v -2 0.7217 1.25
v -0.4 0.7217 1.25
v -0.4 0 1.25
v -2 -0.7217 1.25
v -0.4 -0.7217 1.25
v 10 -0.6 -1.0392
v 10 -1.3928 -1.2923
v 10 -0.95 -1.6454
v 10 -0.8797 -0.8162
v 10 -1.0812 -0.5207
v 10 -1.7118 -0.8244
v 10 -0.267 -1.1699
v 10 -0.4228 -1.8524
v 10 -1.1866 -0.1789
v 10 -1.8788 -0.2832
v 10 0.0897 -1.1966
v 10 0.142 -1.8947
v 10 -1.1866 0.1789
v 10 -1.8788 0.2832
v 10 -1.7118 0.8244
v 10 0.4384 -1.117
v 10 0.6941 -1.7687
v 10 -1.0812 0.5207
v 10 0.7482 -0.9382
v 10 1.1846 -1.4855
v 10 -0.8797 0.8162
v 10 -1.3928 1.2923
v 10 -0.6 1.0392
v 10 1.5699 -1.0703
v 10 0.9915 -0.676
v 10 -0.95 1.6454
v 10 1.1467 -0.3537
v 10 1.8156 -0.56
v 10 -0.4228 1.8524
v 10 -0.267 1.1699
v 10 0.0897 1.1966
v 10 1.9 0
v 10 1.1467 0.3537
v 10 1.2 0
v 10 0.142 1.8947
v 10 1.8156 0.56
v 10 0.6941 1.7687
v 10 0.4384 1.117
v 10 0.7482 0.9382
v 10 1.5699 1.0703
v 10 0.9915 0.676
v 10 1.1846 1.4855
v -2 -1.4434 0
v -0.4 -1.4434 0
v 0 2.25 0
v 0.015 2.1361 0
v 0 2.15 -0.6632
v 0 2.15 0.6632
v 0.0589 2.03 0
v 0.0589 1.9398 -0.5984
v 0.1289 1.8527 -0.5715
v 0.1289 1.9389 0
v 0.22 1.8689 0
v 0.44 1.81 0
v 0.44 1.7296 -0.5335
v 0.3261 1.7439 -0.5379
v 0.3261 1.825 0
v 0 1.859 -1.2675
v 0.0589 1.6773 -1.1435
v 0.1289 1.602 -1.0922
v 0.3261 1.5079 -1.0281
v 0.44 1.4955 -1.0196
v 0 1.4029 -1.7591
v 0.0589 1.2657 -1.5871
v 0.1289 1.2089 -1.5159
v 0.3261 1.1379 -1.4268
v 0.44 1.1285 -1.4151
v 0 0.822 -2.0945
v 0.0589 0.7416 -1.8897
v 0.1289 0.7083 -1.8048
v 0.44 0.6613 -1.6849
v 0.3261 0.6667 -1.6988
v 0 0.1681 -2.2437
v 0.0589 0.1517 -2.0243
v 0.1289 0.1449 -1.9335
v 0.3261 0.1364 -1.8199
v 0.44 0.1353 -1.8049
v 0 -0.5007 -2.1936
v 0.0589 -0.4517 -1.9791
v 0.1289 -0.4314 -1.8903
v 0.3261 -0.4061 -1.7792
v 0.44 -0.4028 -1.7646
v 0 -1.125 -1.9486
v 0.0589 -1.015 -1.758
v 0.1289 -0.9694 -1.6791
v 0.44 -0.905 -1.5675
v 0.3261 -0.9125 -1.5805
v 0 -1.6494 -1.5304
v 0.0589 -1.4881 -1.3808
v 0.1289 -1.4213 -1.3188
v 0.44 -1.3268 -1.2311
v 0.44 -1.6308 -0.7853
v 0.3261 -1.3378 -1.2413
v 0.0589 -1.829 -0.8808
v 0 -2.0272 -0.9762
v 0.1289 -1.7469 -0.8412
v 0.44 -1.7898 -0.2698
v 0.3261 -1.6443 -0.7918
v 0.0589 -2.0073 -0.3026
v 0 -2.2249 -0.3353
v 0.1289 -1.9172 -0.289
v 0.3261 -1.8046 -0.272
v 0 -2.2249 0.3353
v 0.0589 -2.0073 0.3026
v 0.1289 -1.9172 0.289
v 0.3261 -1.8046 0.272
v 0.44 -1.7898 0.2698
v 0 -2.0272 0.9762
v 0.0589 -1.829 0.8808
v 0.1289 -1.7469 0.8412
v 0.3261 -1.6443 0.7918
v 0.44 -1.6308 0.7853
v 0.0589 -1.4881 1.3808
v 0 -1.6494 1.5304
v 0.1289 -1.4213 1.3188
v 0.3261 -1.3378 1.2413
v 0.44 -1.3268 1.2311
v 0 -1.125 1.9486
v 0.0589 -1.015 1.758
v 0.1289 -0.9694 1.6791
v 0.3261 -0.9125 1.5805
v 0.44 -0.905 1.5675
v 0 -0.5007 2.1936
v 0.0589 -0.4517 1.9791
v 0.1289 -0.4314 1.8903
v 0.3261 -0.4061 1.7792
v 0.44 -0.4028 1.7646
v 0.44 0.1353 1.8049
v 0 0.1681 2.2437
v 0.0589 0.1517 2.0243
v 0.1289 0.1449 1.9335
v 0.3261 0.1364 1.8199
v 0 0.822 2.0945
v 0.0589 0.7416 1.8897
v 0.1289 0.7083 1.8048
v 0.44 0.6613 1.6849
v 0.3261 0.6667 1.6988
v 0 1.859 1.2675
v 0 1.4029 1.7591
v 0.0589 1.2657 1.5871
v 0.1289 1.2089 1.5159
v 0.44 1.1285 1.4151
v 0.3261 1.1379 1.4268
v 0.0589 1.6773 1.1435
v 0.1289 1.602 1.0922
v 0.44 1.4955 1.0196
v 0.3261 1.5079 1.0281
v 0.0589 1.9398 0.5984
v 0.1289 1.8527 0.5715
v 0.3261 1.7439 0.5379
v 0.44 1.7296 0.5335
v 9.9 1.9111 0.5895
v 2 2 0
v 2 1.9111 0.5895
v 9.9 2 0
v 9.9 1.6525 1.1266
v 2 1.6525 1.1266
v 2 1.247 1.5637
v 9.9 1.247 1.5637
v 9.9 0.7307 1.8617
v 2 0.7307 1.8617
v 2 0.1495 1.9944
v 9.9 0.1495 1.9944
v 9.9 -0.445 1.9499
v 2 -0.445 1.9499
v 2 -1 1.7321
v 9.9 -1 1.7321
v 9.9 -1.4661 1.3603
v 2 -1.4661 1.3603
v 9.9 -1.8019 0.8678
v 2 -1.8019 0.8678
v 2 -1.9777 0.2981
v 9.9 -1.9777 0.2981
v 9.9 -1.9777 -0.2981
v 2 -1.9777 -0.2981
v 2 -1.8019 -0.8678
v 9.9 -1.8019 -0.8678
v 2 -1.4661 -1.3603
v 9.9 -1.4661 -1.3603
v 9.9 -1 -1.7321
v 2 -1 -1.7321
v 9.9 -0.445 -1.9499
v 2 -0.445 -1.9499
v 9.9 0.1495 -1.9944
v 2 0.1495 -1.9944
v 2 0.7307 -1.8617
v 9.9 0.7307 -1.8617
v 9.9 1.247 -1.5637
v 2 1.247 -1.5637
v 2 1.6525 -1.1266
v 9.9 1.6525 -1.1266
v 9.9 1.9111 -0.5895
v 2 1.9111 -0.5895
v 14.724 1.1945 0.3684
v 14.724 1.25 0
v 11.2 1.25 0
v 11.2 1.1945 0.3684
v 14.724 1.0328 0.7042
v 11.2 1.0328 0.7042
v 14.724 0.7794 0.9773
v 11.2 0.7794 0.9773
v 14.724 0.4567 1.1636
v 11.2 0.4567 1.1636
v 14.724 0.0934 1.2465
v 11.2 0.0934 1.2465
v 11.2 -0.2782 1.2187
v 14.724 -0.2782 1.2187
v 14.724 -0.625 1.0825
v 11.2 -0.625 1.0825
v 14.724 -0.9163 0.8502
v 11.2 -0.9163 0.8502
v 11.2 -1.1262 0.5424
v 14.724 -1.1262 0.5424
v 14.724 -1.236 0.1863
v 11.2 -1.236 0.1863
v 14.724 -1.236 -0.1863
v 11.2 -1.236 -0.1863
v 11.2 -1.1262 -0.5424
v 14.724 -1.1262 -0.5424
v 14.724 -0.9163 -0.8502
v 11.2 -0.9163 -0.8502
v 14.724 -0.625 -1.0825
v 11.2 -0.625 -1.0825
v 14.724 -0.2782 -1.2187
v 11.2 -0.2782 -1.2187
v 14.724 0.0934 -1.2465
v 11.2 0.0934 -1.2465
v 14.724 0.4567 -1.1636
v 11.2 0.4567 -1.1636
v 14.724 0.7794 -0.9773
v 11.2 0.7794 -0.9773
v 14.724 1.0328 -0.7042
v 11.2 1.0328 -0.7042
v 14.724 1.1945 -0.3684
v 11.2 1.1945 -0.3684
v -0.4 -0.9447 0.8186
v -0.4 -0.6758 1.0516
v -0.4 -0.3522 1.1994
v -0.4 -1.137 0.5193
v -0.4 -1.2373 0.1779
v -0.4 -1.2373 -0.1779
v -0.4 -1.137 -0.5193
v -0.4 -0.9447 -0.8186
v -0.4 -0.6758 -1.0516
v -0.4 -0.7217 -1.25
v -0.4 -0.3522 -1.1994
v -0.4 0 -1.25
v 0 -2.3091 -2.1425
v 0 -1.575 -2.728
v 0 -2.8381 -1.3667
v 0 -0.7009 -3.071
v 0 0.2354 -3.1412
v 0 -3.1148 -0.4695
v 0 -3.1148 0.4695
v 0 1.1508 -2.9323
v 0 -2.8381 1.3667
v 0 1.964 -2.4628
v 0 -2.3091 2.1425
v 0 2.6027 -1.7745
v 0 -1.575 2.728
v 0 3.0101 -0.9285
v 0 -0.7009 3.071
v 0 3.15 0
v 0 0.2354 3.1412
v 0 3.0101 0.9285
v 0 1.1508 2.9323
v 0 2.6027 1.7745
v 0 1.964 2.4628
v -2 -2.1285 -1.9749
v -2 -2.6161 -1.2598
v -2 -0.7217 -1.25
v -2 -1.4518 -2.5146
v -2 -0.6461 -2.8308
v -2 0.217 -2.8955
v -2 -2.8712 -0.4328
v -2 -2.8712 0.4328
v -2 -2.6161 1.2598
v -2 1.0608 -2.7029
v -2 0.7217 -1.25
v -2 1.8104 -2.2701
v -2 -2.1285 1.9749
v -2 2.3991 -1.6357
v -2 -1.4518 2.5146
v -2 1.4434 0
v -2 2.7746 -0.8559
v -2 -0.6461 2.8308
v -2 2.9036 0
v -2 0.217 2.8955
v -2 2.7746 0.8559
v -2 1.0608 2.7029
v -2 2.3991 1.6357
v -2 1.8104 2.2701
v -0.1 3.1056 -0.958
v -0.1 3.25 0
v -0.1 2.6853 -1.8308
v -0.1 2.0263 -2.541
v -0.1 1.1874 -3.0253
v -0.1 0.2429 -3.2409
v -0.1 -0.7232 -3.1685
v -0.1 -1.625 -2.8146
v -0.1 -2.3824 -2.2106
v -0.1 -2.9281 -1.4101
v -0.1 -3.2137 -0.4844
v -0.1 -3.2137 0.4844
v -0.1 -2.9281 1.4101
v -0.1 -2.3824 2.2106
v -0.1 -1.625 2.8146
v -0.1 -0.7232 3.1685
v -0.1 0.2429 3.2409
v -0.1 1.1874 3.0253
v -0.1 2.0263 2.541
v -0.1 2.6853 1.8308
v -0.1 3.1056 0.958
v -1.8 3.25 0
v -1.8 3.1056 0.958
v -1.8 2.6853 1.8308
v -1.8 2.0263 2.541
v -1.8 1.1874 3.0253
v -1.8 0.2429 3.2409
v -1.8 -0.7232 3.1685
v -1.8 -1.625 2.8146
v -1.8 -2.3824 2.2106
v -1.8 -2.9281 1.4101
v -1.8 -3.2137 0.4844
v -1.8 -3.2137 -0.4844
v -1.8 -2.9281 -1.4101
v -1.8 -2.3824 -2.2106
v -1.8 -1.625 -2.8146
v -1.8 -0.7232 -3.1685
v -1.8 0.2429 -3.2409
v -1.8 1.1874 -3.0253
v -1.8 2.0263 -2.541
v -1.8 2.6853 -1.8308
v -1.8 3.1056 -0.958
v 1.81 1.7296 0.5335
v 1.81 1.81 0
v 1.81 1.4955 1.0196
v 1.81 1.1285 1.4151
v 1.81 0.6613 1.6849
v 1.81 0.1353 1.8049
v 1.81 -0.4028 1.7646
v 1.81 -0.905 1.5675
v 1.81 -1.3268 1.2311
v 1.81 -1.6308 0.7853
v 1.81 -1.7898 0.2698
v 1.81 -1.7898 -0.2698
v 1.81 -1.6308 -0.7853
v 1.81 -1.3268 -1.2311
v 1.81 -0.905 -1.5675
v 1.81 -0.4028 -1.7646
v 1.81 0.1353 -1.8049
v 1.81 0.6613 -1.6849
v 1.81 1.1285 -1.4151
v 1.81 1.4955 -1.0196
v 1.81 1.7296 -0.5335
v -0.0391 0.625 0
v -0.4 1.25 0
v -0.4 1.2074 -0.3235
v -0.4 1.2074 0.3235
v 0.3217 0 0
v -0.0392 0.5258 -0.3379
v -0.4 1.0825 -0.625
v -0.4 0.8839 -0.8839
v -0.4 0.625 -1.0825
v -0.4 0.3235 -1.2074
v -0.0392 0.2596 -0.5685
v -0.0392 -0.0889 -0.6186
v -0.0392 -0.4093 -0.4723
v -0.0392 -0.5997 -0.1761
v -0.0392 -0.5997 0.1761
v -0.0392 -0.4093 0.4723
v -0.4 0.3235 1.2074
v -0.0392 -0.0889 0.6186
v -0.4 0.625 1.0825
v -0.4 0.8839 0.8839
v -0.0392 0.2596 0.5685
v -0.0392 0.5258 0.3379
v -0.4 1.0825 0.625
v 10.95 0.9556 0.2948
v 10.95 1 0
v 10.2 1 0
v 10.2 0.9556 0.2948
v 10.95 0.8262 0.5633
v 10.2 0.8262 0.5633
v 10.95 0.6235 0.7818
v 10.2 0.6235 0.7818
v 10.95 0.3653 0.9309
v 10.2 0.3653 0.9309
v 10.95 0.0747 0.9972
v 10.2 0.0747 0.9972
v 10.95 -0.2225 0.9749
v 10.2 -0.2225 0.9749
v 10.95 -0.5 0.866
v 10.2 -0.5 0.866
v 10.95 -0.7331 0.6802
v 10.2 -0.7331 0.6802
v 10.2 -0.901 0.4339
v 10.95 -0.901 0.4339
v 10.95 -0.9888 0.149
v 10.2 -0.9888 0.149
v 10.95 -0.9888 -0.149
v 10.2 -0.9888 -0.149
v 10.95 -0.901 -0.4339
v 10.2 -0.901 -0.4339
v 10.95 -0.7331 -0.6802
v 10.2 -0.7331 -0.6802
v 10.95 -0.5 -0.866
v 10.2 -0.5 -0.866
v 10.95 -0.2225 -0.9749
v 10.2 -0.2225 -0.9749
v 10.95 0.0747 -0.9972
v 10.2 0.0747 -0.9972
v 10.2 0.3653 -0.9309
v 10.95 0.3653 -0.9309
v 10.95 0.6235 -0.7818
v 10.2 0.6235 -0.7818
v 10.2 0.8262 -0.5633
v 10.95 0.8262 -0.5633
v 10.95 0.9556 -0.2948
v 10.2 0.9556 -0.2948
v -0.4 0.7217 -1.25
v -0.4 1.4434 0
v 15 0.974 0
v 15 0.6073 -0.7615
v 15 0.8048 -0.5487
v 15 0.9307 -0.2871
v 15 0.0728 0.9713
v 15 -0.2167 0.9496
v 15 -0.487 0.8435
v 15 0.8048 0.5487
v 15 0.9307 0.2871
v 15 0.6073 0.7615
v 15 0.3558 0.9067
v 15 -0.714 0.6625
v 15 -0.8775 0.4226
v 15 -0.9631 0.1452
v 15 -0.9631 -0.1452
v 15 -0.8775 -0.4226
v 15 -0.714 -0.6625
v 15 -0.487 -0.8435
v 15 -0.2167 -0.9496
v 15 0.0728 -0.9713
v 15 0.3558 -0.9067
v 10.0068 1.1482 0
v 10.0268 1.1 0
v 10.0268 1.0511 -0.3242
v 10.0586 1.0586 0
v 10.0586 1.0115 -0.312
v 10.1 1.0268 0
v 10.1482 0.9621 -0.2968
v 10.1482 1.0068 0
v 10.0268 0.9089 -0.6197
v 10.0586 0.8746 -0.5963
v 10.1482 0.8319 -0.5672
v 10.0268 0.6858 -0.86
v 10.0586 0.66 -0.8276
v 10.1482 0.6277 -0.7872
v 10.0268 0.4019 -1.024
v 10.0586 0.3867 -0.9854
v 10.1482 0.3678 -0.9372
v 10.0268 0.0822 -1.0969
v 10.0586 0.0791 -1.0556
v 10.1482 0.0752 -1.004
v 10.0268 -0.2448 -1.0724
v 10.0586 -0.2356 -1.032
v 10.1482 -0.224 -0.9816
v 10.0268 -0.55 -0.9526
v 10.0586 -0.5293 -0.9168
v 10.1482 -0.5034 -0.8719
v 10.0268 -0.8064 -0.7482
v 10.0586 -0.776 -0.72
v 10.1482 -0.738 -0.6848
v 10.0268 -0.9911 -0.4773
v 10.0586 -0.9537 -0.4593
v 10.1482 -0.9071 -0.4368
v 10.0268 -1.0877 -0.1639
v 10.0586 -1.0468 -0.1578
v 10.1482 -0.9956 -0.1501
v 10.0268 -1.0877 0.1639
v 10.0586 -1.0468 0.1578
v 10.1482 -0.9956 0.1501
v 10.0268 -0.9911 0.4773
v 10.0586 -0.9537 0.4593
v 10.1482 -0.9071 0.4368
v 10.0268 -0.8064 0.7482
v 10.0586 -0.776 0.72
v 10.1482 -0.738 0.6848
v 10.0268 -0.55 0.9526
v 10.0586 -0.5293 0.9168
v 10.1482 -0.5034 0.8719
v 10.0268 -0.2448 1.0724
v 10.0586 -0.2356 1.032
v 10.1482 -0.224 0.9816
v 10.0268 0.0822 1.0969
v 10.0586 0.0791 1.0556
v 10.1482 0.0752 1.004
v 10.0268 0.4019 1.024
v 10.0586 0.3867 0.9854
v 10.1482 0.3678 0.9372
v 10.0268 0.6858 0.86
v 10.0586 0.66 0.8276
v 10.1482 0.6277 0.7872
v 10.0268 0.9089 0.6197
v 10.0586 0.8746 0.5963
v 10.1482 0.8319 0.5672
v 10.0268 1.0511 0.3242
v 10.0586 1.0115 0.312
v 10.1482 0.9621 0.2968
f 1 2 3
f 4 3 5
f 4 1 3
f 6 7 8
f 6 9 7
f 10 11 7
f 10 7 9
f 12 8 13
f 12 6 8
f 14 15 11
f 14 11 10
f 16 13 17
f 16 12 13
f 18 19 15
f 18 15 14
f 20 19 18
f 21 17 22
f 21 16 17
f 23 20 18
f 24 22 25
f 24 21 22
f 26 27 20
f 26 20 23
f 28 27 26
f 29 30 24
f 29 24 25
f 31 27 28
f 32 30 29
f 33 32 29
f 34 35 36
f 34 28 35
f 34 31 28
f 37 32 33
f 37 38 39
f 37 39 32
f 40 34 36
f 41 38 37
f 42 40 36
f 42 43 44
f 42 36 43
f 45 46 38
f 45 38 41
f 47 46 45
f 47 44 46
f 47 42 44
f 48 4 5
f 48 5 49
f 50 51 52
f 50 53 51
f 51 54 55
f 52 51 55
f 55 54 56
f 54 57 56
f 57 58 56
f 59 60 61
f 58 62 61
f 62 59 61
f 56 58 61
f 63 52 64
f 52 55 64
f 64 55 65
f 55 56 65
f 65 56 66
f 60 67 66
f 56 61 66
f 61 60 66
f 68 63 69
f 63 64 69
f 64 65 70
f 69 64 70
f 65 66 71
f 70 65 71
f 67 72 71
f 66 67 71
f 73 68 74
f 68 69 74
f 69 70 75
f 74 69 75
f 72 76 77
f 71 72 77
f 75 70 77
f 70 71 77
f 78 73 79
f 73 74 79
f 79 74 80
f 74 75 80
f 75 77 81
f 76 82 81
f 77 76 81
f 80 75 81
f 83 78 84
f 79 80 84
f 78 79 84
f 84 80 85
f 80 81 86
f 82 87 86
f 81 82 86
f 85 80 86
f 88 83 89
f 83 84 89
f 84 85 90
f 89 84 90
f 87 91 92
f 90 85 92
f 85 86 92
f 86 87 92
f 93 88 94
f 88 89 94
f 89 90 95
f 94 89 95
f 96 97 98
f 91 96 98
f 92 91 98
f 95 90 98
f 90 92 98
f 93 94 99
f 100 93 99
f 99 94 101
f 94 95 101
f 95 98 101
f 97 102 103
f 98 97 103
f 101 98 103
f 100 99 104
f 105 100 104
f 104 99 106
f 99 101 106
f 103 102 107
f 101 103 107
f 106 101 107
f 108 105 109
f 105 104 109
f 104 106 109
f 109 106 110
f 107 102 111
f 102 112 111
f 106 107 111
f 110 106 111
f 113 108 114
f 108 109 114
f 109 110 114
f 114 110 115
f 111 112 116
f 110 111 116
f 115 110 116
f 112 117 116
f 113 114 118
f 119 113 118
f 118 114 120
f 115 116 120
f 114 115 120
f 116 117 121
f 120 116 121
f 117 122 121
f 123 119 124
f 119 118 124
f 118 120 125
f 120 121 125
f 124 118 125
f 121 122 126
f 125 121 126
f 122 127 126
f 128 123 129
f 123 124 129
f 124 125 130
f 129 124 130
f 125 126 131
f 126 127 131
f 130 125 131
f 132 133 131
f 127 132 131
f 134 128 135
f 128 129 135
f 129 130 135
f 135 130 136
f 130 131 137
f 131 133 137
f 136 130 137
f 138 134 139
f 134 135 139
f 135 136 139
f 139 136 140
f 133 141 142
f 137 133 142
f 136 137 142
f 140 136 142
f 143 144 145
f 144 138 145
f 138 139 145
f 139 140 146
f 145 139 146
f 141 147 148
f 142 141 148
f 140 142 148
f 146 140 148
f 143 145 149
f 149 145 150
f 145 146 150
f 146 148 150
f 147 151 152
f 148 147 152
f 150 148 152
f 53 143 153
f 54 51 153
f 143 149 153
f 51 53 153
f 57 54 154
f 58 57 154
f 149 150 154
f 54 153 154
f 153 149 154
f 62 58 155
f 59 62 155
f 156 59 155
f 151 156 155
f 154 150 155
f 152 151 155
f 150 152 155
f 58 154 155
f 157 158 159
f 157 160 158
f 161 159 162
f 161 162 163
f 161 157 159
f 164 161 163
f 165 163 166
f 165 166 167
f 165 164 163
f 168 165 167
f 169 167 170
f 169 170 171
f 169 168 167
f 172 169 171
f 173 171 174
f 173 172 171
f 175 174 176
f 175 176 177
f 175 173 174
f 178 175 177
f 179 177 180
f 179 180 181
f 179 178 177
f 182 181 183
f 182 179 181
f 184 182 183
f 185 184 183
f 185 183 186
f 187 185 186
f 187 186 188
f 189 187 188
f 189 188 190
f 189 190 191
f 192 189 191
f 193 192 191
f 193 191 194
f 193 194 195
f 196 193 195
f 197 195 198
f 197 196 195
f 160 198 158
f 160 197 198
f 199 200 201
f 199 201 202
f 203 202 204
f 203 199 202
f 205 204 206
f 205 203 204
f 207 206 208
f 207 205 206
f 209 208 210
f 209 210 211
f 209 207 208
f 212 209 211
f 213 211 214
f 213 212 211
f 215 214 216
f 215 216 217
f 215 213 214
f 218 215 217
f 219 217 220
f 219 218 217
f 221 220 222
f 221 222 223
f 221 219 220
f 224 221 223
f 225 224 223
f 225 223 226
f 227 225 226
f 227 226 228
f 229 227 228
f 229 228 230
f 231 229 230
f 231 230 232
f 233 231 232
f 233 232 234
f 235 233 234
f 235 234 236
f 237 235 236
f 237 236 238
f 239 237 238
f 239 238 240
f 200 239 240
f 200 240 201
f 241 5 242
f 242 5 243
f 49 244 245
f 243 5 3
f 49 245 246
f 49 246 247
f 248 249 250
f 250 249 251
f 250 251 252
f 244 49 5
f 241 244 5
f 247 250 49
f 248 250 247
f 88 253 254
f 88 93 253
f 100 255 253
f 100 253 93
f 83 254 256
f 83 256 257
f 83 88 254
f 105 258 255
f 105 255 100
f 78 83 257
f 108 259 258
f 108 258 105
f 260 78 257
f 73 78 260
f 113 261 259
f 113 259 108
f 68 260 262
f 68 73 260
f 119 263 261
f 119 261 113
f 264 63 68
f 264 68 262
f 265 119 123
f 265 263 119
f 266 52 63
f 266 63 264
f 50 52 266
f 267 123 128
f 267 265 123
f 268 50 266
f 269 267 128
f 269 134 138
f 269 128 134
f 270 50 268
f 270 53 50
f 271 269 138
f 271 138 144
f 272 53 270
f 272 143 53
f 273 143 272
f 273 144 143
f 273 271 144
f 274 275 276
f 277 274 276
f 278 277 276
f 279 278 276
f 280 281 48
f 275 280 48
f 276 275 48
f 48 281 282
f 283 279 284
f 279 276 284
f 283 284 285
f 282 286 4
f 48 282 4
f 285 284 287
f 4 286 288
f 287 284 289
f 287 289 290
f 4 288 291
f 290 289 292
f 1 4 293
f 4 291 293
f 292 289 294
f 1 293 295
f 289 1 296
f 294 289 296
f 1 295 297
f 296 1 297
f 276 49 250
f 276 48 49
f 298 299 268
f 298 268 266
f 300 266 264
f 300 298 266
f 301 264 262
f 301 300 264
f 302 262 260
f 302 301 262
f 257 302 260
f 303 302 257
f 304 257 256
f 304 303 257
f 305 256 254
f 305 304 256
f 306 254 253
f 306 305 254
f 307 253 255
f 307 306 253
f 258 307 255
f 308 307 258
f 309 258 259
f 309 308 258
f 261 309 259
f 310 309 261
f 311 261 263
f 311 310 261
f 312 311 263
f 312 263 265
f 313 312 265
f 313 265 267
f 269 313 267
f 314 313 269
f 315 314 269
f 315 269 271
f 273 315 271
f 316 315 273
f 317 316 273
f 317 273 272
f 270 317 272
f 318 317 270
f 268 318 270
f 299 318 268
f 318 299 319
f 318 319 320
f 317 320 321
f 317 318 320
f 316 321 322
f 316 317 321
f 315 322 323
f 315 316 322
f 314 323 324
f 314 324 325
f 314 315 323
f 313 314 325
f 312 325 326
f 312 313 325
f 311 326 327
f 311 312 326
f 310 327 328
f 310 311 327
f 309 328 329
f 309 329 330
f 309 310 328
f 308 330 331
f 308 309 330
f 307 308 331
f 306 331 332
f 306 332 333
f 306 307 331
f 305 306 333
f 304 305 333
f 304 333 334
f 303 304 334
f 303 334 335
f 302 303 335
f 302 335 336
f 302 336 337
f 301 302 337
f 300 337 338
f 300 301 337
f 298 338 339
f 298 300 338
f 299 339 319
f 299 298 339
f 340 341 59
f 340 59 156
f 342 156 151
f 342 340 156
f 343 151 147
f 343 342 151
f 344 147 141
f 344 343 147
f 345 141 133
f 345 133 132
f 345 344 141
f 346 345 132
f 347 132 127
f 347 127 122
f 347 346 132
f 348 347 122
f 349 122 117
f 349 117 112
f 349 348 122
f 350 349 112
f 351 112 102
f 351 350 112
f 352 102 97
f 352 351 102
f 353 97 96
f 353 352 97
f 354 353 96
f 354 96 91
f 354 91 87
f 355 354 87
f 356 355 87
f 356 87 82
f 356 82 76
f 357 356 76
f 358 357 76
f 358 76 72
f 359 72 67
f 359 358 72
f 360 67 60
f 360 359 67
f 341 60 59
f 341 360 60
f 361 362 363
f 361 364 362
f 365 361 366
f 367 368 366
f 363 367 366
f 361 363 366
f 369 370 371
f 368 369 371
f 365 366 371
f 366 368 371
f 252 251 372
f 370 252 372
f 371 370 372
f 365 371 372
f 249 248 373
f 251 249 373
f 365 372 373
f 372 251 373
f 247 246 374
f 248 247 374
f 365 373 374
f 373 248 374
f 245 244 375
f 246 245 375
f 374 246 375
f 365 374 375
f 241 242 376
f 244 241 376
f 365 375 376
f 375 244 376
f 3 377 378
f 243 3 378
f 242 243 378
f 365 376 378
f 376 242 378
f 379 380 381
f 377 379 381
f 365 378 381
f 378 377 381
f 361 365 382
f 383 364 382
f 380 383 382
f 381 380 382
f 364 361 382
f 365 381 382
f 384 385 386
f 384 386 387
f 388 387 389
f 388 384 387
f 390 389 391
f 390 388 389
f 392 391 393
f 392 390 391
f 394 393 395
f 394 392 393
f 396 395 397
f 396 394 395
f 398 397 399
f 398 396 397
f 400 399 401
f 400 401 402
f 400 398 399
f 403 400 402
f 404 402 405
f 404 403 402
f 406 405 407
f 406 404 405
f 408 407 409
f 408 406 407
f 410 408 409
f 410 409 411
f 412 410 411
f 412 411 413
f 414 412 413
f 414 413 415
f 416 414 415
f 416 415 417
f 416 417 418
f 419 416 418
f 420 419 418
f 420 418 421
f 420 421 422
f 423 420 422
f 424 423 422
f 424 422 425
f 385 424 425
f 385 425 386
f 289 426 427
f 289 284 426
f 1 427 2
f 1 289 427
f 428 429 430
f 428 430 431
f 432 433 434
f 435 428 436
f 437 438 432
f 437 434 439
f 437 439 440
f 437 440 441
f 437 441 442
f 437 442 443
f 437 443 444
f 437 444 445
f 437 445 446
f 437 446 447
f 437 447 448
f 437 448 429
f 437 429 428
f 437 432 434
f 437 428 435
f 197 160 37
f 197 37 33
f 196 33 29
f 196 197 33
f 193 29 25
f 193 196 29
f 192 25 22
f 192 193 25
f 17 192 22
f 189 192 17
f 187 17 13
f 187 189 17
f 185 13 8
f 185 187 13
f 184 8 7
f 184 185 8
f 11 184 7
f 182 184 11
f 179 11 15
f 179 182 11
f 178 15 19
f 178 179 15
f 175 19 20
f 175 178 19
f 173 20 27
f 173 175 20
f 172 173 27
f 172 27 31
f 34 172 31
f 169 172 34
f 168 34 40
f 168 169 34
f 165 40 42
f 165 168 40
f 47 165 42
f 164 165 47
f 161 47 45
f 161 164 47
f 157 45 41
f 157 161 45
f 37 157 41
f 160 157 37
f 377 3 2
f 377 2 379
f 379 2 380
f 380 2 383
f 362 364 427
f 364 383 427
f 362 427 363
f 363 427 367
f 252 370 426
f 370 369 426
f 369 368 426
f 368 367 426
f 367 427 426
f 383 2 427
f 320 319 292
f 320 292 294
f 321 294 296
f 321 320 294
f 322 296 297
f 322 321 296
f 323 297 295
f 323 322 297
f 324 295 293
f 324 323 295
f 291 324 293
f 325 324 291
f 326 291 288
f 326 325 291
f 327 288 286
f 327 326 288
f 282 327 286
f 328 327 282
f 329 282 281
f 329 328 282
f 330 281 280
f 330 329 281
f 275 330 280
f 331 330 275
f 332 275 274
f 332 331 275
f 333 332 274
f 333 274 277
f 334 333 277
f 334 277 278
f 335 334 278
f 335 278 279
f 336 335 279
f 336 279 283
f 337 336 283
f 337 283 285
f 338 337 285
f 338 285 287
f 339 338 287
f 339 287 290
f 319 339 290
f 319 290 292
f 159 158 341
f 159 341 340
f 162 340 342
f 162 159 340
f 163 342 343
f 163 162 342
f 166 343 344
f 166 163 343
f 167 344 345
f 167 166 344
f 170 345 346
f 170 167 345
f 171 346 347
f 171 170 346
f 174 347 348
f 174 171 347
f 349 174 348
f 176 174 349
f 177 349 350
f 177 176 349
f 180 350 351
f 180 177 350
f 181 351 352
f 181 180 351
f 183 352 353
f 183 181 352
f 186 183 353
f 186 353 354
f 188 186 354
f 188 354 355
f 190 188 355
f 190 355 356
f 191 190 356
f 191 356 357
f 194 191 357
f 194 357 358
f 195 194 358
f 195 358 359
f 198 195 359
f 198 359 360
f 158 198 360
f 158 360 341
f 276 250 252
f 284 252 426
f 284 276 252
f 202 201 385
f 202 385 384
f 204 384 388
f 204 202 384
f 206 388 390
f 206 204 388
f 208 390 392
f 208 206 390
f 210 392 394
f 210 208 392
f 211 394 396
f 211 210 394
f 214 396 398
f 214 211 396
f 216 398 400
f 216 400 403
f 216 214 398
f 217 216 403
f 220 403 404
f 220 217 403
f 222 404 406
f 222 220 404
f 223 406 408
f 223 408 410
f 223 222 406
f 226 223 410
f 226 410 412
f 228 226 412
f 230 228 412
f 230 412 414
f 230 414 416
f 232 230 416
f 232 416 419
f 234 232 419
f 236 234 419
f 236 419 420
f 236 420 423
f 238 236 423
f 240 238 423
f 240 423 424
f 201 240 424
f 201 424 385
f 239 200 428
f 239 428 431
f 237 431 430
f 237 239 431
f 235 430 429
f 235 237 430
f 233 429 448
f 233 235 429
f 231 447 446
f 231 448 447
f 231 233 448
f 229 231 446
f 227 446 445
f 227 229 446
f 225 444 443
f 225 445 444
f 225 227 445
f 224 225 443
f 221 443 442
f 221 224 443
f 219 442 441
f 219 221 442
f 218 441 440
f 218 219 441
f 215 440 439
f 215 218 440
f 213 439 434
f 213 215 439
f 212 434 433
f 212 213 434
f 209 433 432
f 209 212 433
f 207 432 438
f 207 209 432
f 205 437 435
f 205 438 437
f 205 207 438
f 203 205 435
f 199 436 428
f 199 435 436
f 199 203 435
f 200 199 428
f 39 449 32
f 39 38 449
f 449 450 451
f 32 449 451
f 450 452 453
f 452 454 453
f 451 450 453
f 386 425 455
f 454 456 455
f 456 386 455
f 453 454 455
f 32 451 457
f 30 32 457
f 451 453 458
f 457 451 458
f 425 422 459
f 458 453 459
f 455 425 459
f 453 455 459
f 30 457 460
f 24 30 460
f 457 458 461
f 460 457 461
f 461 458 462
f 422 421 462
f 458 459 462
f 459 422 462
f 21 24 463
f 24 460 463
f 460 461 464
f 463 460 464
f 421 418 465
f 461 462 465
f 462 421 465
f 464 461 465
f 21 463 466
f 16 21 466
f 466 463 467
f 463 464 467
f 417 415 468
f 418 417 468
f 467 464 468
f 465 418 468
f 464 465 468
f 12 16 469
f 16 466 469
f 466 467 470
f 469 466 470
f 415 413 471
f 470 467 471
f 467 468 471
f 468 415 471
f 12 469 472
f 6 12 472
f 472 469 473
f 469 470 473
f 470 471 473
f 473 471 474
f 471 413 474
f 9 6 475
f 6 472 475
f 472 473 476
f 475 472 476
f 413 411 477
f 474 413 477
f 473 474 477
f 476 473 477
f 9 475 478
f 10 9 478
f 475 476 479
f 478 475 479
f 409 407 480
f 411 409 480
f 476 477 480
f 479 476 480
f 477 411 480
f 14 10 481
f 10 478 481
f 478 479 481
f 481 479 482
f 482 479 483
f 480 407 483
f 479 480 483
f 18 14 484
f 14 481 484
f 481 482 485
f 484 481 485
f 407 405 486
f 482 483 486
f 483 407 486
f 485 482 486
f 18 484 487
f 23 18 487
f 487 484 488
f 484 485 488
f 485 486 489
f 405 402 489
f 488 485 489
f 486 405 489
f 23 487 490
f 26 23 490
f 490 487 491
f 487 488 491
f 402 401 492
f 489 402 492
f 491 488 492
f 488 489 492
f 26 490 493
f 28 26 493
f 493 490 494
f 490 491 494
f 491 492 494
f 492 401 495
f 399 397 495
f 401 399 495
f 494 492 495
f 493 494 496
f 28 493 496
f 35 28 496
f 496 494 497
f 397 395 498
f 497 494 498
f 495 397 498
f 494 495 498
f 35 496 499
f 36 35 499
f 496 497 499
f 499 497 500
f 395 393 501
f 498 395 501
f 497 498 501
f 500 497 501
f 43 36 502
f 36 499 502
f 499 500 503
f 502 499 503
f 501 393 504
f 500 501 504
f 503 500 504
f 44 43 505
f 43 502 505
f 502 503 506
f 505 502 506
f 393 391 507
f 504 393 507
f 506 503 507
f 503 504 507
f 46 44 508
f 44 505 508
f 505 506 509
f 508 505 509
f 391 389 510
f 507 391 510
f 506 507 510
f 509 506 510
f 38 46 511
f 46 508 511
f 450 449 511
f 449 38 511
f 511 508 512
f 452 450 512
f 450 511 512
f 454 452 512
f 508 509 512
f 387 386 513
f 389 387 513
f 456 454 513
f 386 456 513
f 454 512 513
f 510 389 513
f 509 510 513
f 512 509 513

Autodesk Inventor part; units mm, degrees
ref_plane "YZ Plane" through (0, 0, 0) normal (1, 0, 0) x (0, 1, 0)
ref_plane "XZ Plane" through (0, 0, 0) normal (0, 1, 0) x (-1, 0, 0)
ref_plane "XY Plane" through (0, 0, 0) normal (0, 0, 1) x (1, 0, 0)
sketch "_____1" plane through (0, 0, 0) normal (0, 0, 1) x (1, 0, 0)
  line L0 (15, 0) -> (0.3217, 0)
  line L1 (0.3217, 0) -> (-0.4, 1.25)
  line L2 (-0.4, 1.25) -> (-2, 1.25)
  line L3 (-2, 1.25) -> (-2, 2.9036)
  line L4 (-2, 2.9036) -> (-1.8, 3.25)
  line L5 (-1.8, 3.25) -> (-0.1, 3.25)
  line L6 (-0.1, 3.25) -> (0, 3.15)
  line L7 (0, 3.15) -> (0, 2.25)
  arc A0 (0, 2.25) -> (0.44, 1.81) centre (0.44, 2.25) ccw
  line L8 (0.44, 1.81) -> (1.81, 1.81)
  line L9 (1.81, 1.81) -> (2, 2)
  line L10 (2, 2) -> (9.9, 2)
  line L11 (9.9, 2) -> (10, 1.9)
  line L12 (10, 1.9) -> (10, 1.2)
  arc A1 (10, 1.2) -> (10.2, 1) centre (10.2, 1.2) ccw
  line L13 (10.2, 1) -> (10.95, 1)
  line L14 (10.95, 1) -> (11.2, 1.25)
  line L15 (11.2, 1.25) -> (14.724, 1.25)
  line L16 (14.724, 1.25) -> (15, 0.974)
  line L17 (15, 0.974) -> (15, 0)
  line L18 (15, 0) -> (0.3217, 0)
revolve "Revolution1" add sketch "_____1" angle 360 about axis through (15, 0, 0) along (1, 0, 0)
thread "Thread1" size "M2.5x0.45" class "6g" standard "ISO Metric profile" full length
sketch "_____2" plane through (-2, 0, 0) normal (1, 0, 0) x (0, 0, -1)
  line L0 (-1.25, -0.7217) -> (0, -1.4434)
  line L1 (0, -1.4434) -> (1.25, -0.7217)
  line L2 (1.25, -0.7217) -> (1.25, 0.7217)
  line L3 (1.25, 0.7217) -> (0, 1.4434)
  line L4 (0, 1.4434) -> (-1.25, 0.7217)
  line L5 (-1.25, 0.7217) -> (-1.25, -0.7217)
extrude "Extrusion1" cut sketch "_____2" along normal blind 1.6
properties part number "LMSBP4-10"
